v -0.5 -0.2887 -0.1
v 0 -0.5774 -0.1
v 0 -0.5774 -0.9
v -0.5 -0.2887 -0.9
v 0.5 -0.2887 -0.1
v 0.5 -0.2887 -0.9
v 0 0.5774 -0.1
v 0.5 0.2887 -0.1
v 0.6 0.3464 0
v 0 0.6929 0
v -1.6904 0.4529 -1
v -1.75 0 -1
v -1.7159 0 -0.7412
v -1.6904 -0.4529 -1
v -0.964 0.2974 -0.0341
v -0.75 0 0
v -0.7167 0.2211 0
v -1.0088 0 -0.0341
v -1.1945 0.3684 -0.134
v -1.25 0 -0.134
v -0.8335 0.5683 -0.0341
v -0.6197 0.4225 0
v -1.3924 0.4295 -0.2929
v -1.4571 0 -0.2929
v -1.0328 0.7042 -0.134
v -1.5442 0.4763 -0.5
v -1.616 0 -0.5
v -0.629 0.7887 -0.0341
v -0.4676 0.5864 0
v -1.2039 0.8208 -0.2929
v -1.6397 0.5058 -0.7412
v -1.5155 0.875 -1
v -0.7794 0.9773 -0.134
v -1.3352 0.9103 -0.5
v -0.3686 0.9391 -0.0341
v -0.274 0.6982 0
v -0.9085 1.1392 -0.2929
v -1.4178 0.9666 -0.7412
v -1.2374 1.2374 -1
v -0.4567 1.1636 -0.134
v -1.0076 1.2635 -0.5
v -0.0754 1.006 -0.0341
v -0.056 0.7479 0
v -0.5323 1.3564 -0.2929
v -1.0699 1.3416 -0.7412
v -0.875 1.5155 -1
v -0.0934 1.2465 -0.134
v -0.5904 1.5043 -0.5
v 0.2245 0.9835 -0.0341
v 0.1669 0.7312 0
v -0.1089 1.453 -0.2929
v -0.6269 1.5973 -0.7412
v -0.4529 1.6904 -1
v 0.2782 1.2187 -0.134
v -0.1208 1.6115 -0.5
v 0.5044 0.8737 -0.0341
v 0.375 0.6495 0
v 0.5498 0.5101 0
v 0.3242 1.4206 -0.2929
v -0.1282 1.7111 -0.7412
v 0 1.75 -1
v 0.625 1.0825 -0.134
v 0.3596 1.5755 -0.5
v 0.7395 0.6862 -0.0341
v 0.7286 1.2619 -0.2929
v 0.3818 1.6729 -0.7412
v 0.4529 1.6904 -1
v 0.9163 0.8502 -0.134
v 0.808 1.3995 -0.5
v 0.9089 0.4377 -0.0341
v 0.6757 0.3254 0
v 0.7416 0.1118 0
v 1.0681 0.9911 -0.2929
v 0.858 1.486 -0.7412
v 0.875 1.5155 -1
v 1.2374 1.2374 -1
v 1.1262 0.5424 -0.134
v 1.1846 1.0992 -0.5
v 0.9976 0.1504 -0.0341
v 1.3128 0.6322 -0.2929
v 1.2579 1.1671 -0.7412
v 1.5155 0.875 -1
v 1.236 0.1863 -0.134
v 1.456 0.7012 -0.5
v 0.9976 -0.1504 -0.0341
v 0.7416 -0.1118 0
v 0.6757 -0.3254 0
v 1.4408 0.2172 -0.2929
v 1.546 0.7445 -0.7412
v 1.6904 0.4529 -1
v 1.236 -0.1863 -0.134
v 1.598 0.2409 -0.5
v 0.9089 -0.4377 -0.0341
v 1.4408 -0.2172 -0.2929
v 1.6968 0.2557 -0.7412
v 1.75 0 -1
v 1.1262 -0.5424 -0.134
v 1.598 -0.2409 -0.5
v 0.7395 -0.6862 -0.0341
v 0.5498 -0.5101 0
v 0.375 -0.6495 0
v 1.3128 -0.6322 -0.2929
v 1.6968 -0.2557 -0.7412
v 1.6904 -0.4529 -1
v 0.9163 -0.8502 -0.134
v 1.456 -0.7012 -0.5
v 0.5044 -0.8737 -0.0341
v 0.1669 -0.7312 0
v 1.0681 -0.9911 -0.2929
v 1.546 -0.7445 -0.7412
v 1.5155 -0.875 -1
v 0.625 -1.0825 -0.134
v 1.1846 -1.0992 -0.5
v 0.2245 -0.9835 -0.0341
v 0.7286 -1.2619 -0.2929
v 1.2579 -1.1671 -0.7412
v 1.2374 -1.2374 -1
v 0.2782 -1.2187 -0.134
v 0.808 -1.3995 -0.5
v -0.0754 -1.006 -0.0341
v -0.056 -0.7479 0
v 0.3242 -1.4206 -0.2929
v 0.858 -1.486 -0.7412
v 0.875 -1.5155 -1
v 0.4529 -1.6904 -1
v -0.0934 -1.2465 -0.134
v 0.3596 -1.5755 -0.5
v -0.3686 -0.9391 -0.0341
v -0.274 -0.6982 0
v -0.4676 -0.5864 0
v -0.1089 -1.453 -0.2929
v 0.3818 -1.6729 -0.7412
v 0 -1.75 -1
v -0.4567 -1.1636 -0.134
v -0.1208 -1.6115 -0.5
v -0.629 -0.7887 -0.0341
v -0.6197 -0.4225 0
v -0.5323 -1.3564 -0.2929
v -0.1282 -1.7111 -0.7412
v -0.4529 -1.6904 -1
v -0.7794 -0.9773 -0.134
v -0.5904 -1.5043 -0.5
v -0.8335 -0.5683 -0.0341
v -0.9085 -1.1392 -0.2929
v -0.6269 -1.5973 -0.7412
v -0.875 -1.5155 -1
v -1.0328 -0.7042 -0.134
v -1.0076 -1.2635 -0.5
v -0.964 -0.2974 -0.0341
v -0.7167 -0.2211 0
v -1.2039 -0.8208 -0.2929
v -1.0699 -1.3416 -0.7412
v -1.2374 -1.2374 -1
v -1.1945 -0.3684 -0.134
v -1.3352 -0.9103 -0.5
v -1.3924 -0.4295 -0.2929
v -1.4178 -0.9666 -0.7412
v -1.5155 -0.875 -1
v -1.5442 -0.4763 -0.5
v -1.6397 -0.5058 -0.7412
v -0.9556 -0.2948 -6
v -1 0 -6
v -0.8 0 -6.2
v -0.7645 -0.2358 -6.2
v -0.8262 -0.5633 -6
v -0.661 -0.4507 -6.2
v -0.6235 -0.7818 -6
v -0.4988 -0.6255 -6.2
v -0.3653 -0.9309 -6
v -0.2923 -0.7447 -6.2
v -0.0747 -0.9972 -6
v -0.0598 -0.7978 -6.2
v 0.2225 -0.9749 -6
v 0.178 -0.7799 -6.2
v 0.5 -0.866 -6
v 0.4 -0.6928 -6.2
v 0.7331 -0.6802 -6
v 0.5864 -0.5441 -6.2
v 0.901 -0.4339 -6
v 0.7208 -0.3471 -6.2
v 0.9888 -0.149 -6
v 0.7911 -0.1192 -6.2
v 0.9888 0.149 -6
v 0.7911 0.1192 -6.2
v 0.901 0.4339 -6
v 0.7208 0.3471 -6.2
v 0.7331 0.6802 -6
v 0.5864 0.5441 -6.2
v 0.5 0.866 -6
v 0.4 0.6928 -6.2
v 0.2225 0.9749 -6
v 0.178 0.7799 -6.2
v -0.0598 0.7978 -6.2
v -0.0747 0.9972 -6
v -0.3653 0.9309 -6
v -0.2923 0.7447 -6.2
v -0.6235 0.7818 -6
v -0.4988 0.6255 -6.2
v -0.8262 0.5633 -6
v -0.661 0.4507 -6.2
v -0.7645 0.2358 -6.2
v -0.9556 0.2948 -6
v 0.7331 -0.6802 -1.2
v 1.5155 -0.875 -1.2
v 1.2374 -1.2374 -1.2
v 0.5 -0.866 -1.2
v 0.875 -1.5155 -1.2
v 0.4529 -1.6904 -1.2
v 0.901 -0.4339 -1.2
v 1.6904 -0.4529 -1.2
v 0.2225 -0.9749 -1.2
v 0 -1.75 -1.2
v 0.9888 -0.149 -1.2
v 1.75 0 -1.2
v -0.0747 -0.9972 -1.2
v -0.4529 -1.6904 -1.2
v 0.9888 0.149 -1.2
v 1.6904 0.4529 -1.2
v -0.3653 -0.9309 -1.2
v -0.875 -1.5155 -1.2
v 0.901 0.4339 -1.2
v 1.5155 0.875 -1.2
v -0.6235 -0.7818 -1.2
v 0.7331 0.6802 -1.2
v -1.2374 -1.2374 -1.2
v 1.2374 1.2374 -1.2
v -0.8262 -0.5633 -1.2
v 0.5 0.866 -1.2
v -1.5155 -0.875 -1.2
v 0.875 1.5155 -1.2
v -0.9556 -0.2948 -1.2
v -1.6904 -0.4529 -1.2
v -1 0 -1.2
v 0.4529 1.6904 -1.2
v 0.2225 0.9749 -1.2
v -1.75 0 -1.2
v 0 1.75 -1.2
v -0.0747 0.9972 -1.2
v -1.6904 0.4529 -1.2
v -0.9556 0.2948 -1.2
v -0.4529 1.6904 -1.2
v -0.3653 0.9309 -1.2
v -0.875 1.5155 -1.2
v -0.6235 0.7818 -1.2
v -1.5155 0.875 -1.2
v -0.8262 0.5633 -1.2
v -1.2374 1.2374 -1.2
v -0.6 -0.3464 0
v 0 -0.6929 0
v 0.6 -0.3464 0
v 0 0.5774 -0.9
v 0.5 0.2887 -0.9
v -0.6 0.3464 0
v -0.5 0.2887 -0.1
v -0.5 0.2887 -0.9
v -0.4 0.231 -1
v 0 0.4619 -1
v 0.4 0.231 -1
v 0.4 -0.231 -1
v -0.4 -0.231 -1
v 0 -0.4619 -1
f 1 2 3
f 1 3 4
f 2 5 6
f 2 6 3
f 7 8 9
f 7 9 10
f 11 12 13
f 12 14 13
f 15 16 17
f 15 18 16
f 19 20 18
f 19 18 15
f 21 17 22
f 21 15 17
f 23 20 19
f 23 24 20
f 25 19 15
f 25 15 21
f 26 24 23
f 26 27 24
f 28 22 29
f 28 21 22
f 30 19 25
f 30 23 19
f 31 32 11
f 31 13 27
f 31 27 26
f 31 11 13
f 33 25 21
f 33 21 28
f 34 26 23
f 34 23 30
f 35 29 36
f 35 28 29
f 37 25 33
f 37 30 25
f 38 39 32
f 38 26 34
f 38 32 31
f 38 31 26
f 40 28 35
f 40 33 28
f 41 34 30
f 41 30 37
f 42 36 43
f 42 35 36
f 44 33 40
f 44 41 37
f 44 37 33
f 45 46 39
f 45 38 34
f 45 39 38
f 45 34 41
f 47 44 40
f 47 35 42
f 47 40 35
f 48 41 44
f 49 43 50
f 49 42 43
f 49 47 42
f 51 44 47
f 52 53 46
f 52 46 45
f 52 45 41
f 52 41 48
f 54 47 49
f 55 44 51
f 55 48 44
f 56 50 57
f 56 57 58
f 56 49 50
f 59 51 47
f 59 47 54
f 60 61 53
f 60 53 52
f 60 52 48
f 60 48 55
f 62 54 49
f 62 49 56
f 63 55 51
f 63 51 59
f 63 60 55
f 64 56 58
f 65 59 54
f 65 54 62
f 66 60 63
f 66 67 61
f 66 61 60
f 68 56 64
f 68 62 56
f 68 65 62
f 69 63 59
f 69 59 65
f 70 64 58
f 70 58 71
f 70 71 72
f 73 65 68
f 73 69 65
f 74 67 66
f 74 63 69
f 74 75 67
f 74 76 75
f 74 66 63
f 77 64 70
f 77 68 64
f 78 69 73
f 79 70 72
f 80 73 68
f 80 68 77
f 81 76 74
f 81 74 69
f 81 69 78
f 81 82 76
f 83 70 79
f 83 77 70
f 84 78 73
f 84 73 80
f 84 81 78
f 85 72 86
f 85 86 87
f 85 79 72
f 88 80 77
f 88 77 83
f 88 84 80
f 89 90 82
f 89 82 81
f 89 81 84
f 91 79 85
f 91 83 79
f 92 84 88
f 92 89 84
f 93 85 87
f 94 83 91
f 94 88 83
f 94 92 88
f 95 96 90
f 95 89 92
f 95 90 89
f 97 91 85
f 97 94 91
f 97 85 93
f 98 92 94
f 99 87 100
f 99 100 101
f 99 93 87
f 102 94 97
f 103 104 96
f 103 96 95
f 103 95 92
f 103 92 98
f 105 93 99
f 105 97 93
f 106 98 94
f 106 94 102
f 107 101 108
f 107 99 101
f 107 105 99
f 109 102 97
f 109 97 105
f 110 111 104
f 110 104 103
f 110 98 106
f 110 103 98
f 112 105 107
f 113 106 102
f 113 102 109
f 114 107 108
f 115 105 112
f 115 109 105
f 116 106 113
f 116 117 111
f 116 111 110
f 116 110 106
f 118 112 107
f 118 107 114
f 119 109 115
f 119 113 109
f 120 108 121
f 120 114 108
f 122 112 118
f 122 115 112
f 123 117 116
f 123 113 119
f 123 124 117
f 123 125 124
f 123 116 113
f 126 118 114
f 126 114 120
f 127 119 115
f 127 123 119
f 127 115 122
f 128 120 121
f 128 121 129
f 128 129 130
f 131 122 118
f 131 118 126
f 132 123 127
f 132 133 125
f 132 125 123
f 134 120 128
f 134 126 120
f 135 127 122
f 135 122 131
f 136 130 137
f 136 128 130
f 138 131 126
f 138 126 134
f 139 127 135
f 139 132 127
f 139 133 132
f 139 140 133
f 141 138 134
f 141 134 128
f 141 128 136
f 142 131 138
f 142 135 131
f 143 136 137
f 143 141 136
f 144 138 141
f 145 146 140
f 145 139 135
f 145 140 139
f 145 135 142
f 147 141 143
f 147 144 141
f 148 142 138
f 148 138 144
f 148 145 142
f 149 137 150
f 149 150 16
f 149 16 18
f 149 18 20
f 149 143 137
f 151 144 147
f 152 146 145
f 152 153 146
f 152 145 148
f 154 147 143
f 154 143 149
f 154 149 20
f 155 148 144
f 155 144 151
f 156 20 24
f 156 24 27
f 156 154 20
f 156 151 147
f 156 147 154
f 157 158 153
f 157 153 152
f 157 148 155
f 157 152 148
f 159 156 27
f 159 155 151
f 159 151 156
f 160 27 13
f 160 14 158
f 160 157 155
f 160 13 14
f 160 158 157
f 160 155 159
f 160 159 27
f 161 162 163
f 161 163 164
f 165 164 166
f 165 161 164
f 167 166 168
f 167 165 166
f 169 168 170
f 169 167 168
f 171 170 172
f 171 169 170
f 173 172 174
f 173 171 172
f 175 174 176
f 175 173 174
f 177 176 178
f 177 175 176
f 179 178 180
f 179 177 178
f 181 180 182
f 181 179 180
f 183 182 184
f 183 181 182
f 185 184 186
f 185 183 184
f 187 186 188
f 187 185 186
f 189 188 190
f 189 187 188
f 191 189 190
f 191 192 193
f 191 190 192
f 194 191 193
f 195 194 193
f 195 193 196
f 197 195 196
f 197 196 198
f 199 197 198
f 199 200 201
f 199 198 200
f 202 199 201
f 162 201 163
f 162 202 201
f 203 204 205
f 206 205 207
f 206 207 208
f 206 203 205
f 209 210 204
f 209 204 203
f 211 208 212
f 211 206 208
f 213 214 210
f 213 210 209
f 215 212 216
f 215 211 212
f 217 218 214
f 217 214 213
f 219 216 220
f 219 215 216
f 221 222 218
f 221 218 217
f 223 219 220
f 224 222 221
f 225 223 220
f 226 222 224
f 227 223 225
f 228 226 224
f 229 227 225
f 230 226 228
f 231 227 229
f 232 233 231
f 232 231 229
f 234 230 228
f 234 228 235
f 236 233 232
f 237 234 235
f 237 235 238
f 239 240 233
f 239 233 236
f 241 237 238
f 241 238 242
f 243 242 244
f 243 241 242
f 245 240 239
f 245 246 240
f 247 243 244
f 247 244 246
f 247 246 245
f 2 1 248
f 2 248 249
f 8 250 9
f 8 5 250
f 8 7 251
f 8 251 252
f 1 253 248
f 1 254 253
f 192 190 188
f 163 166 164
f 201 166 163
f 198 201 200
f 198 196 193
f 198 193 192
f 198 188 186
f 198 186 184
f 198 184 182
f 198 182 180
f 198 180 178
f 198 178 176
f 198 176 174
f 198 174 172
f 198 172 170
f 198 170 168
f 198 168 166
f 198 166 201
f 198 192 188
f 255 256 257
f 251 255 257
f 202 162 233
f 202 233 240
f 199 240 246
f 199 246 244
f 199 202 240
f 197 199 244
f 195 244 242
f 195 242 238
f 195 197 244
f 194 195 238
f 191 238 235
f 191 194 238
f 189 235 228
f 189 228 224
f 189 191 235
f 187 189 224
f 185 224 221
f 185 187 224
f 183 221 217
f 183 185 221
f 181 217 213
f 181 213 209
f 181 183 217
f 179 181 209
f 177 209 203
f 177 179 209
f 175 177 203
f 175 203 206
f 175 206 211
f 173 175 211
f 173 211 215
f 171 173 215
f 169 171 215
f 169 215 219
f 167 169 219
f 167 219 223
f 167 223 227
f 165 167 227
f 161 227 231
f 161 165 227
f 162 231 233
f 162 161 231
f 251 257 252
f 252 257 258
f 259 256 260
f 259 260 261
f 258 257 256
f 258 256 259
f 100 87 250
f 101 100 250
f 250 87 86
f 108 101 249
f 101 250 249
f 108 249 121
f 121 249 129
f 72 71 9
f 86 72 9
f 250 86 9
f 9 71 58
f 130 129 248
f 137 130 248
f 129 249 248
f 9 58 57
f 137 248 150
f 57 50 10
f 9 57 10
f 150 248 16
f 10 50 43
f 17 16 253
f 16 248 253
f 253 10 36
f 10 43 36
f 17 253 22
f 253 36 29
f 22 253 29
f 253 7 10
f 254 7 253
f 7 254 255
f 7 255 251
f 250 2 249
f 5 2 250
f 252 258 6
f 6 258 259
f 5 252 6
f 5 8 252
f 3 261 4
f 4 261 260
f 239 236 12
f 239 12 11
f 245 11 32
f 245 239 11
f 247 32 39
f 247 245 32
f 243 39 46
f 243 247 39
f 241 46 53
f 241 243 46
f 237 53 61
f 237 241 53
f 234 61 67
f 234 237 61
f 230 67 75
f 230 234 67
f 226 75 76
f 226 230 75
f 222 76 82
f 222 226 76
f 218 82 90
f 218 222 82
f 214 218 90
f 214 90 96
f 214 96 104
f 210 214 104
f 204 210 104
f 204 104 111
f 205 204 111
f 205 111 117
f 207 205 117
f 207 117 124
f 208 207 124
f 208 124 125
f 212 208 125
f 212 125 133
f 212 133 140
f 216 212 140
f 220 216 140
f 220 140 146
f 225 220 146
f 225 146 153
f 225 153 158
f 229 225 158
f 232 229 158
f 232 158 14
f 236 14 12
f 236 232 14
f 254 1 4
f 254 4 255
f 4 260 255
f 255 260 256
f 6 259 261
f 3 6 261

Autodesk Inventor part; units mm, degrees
ref_plane "YZ Plane" through (0, 0, 0) normal (1, 0, 0) x (0, 1, 0)
ref_plane "XZ Plane" through (0, 0, 0) normal (0, 1, 0) x (-1, 0, 0)
ref_plane "XY Plane" through (0, 0, 0) normal (0, 0, 1) x (1, 0, 0)
sketch "Sketch2" plane through (0, 0, 0) normal (0, 1, 0) x (-1, 0, 0)
  line L0 (0, 0) -> (1.75, 0)
  line L1 (1.75, 0) -> (1.75, -1.2)
  line L2 (1.75, -1.2) -> (1, -1.2)
  line L3 (1, -1.2) -> (1, -6.2)
  line L4 (1, -6.2) -> (0, -6.2)
  line L5 (0, 0) -> (0, -6.2)
  dimension "d9" = 1.75
  dimension "d10" = 1.2
  dimension "d12" = 5
  dimension "d19" = 2
revolve "Revolution1" add sketch "Sketch2" angle 360 about axis through (0, 0, 0) along (0, 0, -1)
fillet "Fillet1" radius 1 1 edges at (1.75, 0, 0)
chamfer "Chamfer1" distance 0.2 angle 45 1 edges at (1, 0, -6.2)
thread "Thread1" size "M2x0.4" class "6g" standard "ANSI Metric M Profile" full length
sketch "Sketch4" plane through (0, 0, 0) normal (0, 0, 1) x (1, 0, 0)
  line L0 (0, 0.5774) -> (0.5, 0.2887)
  line L1 (0.5, 0.2887) -> (0.5, -0.2887)
  line L2 (0.5, -0.2887) -> (0, -0.5774)
  line L3 (0, -0.5774) -> (-0.5, -0.2887)
  line L4 (-0.5, -0.2887) -> (-0.5, 0.2887)
  line L5 (-0.5, 0.2887) -> (0, 0.5774)
  point P0 (0, 0)
  point P1 (0, 0)
  dimension "d22" = 1
  dimension "d24" = 0.2887
extrude "Extrusion2" cut sketch "Sketch4" against normal blind 1
chamfer "Chamfer2" distance 0.1 angle 45 12 edges at (-0.5, 0, 0) (-0.25, 0.433, 0) (0.25, 0.433, 0) (0.5, 0, 0) (0.25, -0.433, 0) (-0.25, -0.433, 0) (-0.25, 0.433, -1) (-0.5, 0, -1) (-0.25, -0.433, -1) (0.25, -0.433, -1) (0.5, 0, -1) (0.25, 0.433, -1)
properties part number "rapoukHexagonScrewM2v0" material "Steel, Carbon"
